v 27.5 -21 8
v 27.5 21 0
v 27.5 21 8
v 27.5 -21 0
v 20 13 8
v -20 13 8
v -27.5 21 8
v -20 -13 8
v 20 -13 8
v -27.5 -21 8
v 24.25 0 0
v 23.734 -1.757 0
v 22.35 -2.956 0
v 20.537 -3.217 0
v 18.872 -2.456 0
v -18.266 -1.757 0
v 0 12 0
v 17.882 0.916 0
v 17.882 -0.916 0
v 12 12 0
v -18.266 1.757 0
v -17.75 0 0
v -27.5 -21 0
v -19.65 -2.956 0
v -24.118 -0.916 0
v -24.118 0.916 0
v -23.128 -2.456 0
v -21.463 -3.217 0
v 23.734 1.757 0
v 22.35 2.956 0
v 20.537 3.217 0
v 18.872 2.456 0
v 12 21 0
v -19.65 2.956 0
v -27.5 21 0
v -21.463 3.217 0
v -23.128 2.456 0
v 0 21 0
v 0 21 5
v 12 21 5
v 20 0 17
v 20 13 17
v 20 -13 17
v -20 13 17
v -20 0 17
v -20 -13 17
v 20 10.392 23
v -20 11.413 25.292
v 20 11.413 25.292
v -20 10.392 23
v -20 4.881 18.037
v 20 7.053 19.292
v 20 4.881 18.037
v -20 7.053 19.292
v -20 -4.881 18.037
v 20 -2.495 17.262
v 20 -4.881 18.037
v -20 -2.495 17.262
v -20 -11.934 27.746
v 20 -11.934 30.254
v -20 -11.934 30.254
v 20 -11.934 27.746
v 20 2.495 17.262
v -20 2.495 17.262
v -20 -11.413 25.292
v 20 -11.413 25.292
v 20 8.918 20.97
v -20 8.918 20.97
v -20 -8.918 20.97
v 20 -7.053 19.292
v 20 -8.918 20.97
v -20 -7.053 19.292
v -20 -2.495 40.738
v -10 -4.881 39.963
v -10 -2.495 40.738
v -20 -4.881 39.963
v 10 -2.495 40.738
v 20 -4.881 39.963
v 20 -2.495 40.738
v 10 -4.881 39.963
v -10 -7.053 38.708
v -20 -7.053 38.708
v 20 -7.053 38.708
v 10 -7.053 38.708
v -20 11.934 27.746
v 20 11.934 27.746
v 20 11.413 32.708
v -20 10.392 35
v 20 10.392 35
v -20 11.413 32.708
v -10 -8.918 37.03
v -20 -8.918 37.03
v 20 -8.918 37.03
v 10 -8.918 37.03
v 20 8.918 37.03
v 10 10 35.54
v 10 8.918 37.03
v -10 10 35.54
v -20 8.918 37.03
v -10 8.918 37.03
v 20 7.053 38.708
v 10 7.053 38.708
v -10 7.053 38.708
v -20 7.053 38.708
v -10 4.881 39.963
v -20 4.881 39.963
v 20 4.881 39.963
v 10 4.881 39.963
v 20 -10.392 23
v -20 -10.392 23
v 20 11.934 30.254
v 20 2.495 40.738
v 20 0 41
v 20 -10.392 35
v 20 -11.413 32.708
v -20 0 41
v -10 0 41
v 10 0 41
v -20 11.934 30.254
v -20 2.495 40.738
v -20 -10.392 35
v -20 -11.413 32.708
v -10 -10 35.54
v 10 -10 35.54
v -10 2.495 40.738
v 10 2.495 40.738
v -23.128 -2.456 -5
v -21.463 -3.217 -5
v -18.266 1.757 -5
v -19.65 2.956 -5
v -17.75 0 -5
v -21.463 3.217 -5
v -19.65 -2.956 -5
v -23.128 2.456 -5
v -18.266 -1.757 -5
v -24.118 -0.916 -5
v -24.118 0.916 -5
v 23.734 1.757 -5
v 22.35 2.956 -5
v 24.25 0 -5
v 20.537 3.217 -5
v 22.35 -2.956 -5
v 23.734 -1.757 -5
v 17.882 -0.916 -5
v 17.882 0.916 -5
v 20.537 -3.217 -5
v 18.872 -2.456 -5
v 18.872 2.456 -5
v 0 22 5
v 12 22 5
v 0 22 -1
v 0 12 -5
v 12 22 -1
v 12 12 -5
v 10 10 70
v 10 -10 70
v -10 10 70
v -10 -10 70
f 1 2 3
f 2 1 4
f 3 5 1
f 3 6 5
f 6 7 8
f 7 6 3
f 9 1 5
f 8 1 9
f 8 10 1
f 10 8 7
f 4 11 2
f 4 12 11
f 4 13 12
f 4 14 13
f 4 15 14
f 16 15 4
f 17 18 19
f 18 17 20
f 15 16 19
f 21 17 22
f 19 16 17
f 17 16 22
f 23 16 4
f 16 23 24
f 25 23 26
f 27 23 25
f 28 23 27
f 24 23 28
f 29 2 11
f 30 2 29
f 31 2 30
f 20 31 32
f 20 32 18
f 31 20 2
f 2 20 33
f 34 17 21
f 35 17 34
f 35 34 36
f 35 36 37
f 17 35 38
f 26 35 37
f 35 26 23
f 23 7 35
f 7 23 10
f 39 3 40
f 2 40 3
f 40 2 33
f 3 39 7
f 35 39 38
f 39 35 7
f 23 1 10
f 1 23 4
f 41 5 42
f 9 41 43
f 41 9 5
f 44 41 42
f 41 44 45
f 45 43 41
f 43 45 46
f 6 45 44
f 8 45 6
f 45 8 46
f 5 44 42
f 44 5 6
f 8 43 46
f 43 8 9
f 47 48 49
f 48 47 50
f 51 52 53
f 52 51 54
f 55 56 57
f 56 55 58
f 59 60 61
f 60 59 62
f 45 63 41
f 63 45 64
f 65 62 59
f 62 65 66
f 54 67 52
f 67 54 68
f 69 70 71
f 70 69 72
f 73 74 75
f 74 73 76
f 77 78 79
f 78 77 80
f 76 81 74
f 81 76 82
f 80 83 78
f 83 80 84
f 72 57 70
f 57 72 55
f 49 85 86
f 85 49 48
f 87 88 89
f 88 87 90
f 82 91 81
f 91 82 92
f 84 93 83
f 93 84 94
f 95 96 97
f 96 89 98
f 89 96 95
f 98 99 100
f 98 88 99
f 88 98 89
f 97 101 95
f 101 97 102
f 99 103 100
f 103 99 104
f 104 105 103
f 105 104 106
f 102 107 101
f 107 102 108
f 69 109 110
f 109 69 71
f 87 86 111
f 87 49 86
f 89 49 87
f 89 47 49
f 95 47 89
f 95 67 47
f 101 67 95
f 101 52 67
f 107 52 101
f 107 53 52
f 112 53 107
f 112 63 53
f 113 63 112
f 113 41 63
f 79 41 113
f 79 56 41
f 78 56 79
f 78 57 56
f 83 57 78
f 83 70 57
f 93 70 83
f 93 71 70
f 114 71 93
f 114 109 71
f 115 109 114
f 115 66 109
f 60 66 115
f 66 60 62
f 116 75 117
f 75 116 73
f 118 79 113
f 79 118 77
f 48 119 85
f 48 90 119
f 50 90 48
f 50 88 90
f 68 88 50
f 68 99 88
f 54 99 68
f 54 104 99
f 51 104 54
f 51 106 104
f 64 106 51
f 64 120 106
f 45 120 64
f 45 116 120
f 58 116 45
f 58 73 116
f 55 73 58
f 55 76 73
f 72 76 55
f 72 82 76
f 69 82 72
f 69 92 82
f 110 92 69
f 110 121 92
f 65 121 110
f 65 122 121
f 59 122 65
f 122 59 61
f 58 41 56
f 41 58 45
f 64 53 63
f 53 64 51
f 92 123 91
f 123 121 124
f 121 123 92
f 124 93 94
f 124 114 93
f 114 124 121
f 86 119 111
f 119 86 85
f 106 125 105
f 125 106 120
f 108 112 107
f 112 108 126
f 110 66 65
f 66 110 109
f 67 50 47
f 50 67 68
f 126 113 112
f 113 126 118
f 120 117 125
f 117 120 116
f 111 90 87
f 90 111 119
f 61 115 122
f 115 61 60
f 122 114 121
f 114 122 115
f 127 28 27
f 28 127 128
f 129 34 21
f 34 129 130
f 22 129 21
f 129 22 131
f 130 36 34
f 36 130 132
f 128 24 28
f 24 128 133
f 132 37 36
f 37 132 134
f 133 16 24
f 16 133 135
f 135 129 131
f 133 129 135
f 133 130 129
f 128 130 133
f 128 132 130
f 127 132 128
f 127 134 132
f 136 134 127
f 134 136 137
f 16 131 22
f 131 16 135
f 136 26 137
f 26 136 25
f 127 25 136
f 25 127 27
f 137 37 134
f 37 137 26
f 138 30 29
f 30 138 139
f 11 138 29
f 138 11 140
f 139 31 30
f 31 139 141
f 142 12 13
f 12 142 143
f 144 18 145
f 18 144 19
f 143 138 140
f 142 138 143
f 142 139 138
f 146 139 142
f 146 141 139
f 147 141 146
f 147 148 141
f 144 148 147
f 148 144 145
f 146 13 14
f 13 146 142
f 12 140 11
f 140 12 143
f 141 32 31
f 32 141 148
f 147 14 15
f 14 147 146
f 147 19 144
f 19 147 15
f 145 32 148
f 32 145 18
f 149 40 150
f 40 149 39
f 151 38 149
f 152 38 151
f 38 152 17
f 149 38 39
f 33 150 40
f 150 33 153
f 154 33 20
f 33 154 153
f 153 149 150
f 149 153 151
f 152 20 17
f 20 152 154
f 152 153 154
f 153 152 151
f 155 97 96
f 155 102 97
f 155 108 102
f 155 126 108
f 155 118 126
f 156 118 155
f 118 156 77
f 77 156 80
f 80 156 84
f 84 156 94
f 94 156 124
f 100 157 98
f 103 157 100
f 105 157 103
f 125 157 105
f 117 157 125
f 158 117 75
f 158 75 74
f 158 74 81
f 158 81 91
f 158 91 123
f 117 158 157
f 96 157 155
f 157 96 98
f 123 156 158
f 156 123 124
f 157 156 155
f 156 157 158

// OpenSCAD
// Parameters
shaft_diameter = 8.0; //[4.0:16.0:0.1]
bore_clearance = 0.2; //[0.0:0.6:0.05]
base_length = 55.0; //[30.0:110.0:1]
base_width = 42.0; //[21.0:84.0:1]
base_thickness = 8.0; //[4.0:16.0:0.5]
overall_height = 30.0; //[18.0:60.0:1]
mount_hole_diameter = 6.5; //[3.0:10.0:0.1]
mount_hole_center_spacing = 42.0; //[20.0:90.0:1]
mount_hole_edge_margin_length = 6.5; //[3.0:15.0:0.5]
mount_hole_edge_margin_width = 8.0; //[4.0:16.0:0.5]
fillet_radius = 2.0; //[0.0:6.0:0.5]
overlap = 1.0; //[0.5:2.0:0.1]
housing_length = 40.0; //[25.0:80.0:1]
housing_outer_diameter = 24.0; //[16.0:48.0:0.5]
pedestal_length = 40.0; //[25.0:80.0:1]
pedestal_width = 26.0; //[16.0:52.0:1]
pedestal_height = 10.0; //[6.0:20.0:0.5]
seat_diameter = 18.0; //[12.0:36.0:0.5]
seat_depth = 6.0; //[2.0:12.0:0.5]
trapezoid_base = 10.0; //[5.0:25.0:0.5]
trapezoid_top = 6.0; //[3.0:20.0:0.5]
trapezoid_height = 10.0; //[5.0:25.0:0.5]
trapezoid_thickness = 12.0; //[6.0:30.0:1]

// Right Trapezoid
module right_trapezoid() {
  color("Silver") {
    linear_extrude(height=trapezoid_thickness) {
      polygon(points=[
        [0, 0],
        [trapezoid_base, 0],
        [trapezoid_top, trapezoid_height],
        [0, trapezoid_height]
      ]);
    }
  }
}

// Sbr Bearing Block Assembly
module sbr_bearing_block_assembly() {
  color("DimGray") {
    // Placeholder for detailed geometry
    cube([20, 20, 20], center=true);
  }
}

// Kp Pillow Block Assembly
module kp_pillow_block_assembly() {
  color("Black") {
    // Base Plate
    translate([0, 0, base_thickness/2])
      cube([base_length, base_width, base_thickness], center=true);
    // Pedestal
    translate([0, 0, base_thickness + pedestal_height/2 - overlap])
      cube([pedestal_length, pedestal_width, pedestal_height], center=true);
    // Housing
    translate([0, 0, base_thickness + pedestal_height + housing_outer_diameter/2 - overlap])
      rotate([0, 90, 0])
      cylinder(r=housing_outer_diameter/2, h=housing_length, center=true);
  }
}

// Scs Bearing Block
module scs_bearing_block() {
  color("DimGray") {
    // Placeholder for detailed geometry
    cube([20, 20, 20], center=true);
  }
}

// Kp Pillow Block Hole Positions
module kp_pillow_block_hole_positions() {
  color("Silver") {
    // Left Mounting Hole
    translate([-mount_hole_center_spacing/2, 0, 0])
      cylinder(r=mount_hole_diameter/2, h=base_thickness + 2*overlap, center=true);
    // Right Mounting Hole
    translate([mount_hole_center_spacing/2, 0, 0])
      cylinder(r=mount_hole_diameter/2, h=base_thickness + 2*overlap, center=true);
  }
}

// Assembly
module assembly() {
  kp_pillow_block_assembly();
  kp_pillow_block_hole_positions();
  translate([0, pedestal_width/2 - overlap, base_thickness/2 + overlap])
    rotate([0, 90, 0])
    right_trapezoid();
  translate([0, 0, overall_height + 10])
    sbr_bearing_block_assembly();
  translate([0, 0, overall_height + 30])
    scs_bearing_block();
}

assembly();
